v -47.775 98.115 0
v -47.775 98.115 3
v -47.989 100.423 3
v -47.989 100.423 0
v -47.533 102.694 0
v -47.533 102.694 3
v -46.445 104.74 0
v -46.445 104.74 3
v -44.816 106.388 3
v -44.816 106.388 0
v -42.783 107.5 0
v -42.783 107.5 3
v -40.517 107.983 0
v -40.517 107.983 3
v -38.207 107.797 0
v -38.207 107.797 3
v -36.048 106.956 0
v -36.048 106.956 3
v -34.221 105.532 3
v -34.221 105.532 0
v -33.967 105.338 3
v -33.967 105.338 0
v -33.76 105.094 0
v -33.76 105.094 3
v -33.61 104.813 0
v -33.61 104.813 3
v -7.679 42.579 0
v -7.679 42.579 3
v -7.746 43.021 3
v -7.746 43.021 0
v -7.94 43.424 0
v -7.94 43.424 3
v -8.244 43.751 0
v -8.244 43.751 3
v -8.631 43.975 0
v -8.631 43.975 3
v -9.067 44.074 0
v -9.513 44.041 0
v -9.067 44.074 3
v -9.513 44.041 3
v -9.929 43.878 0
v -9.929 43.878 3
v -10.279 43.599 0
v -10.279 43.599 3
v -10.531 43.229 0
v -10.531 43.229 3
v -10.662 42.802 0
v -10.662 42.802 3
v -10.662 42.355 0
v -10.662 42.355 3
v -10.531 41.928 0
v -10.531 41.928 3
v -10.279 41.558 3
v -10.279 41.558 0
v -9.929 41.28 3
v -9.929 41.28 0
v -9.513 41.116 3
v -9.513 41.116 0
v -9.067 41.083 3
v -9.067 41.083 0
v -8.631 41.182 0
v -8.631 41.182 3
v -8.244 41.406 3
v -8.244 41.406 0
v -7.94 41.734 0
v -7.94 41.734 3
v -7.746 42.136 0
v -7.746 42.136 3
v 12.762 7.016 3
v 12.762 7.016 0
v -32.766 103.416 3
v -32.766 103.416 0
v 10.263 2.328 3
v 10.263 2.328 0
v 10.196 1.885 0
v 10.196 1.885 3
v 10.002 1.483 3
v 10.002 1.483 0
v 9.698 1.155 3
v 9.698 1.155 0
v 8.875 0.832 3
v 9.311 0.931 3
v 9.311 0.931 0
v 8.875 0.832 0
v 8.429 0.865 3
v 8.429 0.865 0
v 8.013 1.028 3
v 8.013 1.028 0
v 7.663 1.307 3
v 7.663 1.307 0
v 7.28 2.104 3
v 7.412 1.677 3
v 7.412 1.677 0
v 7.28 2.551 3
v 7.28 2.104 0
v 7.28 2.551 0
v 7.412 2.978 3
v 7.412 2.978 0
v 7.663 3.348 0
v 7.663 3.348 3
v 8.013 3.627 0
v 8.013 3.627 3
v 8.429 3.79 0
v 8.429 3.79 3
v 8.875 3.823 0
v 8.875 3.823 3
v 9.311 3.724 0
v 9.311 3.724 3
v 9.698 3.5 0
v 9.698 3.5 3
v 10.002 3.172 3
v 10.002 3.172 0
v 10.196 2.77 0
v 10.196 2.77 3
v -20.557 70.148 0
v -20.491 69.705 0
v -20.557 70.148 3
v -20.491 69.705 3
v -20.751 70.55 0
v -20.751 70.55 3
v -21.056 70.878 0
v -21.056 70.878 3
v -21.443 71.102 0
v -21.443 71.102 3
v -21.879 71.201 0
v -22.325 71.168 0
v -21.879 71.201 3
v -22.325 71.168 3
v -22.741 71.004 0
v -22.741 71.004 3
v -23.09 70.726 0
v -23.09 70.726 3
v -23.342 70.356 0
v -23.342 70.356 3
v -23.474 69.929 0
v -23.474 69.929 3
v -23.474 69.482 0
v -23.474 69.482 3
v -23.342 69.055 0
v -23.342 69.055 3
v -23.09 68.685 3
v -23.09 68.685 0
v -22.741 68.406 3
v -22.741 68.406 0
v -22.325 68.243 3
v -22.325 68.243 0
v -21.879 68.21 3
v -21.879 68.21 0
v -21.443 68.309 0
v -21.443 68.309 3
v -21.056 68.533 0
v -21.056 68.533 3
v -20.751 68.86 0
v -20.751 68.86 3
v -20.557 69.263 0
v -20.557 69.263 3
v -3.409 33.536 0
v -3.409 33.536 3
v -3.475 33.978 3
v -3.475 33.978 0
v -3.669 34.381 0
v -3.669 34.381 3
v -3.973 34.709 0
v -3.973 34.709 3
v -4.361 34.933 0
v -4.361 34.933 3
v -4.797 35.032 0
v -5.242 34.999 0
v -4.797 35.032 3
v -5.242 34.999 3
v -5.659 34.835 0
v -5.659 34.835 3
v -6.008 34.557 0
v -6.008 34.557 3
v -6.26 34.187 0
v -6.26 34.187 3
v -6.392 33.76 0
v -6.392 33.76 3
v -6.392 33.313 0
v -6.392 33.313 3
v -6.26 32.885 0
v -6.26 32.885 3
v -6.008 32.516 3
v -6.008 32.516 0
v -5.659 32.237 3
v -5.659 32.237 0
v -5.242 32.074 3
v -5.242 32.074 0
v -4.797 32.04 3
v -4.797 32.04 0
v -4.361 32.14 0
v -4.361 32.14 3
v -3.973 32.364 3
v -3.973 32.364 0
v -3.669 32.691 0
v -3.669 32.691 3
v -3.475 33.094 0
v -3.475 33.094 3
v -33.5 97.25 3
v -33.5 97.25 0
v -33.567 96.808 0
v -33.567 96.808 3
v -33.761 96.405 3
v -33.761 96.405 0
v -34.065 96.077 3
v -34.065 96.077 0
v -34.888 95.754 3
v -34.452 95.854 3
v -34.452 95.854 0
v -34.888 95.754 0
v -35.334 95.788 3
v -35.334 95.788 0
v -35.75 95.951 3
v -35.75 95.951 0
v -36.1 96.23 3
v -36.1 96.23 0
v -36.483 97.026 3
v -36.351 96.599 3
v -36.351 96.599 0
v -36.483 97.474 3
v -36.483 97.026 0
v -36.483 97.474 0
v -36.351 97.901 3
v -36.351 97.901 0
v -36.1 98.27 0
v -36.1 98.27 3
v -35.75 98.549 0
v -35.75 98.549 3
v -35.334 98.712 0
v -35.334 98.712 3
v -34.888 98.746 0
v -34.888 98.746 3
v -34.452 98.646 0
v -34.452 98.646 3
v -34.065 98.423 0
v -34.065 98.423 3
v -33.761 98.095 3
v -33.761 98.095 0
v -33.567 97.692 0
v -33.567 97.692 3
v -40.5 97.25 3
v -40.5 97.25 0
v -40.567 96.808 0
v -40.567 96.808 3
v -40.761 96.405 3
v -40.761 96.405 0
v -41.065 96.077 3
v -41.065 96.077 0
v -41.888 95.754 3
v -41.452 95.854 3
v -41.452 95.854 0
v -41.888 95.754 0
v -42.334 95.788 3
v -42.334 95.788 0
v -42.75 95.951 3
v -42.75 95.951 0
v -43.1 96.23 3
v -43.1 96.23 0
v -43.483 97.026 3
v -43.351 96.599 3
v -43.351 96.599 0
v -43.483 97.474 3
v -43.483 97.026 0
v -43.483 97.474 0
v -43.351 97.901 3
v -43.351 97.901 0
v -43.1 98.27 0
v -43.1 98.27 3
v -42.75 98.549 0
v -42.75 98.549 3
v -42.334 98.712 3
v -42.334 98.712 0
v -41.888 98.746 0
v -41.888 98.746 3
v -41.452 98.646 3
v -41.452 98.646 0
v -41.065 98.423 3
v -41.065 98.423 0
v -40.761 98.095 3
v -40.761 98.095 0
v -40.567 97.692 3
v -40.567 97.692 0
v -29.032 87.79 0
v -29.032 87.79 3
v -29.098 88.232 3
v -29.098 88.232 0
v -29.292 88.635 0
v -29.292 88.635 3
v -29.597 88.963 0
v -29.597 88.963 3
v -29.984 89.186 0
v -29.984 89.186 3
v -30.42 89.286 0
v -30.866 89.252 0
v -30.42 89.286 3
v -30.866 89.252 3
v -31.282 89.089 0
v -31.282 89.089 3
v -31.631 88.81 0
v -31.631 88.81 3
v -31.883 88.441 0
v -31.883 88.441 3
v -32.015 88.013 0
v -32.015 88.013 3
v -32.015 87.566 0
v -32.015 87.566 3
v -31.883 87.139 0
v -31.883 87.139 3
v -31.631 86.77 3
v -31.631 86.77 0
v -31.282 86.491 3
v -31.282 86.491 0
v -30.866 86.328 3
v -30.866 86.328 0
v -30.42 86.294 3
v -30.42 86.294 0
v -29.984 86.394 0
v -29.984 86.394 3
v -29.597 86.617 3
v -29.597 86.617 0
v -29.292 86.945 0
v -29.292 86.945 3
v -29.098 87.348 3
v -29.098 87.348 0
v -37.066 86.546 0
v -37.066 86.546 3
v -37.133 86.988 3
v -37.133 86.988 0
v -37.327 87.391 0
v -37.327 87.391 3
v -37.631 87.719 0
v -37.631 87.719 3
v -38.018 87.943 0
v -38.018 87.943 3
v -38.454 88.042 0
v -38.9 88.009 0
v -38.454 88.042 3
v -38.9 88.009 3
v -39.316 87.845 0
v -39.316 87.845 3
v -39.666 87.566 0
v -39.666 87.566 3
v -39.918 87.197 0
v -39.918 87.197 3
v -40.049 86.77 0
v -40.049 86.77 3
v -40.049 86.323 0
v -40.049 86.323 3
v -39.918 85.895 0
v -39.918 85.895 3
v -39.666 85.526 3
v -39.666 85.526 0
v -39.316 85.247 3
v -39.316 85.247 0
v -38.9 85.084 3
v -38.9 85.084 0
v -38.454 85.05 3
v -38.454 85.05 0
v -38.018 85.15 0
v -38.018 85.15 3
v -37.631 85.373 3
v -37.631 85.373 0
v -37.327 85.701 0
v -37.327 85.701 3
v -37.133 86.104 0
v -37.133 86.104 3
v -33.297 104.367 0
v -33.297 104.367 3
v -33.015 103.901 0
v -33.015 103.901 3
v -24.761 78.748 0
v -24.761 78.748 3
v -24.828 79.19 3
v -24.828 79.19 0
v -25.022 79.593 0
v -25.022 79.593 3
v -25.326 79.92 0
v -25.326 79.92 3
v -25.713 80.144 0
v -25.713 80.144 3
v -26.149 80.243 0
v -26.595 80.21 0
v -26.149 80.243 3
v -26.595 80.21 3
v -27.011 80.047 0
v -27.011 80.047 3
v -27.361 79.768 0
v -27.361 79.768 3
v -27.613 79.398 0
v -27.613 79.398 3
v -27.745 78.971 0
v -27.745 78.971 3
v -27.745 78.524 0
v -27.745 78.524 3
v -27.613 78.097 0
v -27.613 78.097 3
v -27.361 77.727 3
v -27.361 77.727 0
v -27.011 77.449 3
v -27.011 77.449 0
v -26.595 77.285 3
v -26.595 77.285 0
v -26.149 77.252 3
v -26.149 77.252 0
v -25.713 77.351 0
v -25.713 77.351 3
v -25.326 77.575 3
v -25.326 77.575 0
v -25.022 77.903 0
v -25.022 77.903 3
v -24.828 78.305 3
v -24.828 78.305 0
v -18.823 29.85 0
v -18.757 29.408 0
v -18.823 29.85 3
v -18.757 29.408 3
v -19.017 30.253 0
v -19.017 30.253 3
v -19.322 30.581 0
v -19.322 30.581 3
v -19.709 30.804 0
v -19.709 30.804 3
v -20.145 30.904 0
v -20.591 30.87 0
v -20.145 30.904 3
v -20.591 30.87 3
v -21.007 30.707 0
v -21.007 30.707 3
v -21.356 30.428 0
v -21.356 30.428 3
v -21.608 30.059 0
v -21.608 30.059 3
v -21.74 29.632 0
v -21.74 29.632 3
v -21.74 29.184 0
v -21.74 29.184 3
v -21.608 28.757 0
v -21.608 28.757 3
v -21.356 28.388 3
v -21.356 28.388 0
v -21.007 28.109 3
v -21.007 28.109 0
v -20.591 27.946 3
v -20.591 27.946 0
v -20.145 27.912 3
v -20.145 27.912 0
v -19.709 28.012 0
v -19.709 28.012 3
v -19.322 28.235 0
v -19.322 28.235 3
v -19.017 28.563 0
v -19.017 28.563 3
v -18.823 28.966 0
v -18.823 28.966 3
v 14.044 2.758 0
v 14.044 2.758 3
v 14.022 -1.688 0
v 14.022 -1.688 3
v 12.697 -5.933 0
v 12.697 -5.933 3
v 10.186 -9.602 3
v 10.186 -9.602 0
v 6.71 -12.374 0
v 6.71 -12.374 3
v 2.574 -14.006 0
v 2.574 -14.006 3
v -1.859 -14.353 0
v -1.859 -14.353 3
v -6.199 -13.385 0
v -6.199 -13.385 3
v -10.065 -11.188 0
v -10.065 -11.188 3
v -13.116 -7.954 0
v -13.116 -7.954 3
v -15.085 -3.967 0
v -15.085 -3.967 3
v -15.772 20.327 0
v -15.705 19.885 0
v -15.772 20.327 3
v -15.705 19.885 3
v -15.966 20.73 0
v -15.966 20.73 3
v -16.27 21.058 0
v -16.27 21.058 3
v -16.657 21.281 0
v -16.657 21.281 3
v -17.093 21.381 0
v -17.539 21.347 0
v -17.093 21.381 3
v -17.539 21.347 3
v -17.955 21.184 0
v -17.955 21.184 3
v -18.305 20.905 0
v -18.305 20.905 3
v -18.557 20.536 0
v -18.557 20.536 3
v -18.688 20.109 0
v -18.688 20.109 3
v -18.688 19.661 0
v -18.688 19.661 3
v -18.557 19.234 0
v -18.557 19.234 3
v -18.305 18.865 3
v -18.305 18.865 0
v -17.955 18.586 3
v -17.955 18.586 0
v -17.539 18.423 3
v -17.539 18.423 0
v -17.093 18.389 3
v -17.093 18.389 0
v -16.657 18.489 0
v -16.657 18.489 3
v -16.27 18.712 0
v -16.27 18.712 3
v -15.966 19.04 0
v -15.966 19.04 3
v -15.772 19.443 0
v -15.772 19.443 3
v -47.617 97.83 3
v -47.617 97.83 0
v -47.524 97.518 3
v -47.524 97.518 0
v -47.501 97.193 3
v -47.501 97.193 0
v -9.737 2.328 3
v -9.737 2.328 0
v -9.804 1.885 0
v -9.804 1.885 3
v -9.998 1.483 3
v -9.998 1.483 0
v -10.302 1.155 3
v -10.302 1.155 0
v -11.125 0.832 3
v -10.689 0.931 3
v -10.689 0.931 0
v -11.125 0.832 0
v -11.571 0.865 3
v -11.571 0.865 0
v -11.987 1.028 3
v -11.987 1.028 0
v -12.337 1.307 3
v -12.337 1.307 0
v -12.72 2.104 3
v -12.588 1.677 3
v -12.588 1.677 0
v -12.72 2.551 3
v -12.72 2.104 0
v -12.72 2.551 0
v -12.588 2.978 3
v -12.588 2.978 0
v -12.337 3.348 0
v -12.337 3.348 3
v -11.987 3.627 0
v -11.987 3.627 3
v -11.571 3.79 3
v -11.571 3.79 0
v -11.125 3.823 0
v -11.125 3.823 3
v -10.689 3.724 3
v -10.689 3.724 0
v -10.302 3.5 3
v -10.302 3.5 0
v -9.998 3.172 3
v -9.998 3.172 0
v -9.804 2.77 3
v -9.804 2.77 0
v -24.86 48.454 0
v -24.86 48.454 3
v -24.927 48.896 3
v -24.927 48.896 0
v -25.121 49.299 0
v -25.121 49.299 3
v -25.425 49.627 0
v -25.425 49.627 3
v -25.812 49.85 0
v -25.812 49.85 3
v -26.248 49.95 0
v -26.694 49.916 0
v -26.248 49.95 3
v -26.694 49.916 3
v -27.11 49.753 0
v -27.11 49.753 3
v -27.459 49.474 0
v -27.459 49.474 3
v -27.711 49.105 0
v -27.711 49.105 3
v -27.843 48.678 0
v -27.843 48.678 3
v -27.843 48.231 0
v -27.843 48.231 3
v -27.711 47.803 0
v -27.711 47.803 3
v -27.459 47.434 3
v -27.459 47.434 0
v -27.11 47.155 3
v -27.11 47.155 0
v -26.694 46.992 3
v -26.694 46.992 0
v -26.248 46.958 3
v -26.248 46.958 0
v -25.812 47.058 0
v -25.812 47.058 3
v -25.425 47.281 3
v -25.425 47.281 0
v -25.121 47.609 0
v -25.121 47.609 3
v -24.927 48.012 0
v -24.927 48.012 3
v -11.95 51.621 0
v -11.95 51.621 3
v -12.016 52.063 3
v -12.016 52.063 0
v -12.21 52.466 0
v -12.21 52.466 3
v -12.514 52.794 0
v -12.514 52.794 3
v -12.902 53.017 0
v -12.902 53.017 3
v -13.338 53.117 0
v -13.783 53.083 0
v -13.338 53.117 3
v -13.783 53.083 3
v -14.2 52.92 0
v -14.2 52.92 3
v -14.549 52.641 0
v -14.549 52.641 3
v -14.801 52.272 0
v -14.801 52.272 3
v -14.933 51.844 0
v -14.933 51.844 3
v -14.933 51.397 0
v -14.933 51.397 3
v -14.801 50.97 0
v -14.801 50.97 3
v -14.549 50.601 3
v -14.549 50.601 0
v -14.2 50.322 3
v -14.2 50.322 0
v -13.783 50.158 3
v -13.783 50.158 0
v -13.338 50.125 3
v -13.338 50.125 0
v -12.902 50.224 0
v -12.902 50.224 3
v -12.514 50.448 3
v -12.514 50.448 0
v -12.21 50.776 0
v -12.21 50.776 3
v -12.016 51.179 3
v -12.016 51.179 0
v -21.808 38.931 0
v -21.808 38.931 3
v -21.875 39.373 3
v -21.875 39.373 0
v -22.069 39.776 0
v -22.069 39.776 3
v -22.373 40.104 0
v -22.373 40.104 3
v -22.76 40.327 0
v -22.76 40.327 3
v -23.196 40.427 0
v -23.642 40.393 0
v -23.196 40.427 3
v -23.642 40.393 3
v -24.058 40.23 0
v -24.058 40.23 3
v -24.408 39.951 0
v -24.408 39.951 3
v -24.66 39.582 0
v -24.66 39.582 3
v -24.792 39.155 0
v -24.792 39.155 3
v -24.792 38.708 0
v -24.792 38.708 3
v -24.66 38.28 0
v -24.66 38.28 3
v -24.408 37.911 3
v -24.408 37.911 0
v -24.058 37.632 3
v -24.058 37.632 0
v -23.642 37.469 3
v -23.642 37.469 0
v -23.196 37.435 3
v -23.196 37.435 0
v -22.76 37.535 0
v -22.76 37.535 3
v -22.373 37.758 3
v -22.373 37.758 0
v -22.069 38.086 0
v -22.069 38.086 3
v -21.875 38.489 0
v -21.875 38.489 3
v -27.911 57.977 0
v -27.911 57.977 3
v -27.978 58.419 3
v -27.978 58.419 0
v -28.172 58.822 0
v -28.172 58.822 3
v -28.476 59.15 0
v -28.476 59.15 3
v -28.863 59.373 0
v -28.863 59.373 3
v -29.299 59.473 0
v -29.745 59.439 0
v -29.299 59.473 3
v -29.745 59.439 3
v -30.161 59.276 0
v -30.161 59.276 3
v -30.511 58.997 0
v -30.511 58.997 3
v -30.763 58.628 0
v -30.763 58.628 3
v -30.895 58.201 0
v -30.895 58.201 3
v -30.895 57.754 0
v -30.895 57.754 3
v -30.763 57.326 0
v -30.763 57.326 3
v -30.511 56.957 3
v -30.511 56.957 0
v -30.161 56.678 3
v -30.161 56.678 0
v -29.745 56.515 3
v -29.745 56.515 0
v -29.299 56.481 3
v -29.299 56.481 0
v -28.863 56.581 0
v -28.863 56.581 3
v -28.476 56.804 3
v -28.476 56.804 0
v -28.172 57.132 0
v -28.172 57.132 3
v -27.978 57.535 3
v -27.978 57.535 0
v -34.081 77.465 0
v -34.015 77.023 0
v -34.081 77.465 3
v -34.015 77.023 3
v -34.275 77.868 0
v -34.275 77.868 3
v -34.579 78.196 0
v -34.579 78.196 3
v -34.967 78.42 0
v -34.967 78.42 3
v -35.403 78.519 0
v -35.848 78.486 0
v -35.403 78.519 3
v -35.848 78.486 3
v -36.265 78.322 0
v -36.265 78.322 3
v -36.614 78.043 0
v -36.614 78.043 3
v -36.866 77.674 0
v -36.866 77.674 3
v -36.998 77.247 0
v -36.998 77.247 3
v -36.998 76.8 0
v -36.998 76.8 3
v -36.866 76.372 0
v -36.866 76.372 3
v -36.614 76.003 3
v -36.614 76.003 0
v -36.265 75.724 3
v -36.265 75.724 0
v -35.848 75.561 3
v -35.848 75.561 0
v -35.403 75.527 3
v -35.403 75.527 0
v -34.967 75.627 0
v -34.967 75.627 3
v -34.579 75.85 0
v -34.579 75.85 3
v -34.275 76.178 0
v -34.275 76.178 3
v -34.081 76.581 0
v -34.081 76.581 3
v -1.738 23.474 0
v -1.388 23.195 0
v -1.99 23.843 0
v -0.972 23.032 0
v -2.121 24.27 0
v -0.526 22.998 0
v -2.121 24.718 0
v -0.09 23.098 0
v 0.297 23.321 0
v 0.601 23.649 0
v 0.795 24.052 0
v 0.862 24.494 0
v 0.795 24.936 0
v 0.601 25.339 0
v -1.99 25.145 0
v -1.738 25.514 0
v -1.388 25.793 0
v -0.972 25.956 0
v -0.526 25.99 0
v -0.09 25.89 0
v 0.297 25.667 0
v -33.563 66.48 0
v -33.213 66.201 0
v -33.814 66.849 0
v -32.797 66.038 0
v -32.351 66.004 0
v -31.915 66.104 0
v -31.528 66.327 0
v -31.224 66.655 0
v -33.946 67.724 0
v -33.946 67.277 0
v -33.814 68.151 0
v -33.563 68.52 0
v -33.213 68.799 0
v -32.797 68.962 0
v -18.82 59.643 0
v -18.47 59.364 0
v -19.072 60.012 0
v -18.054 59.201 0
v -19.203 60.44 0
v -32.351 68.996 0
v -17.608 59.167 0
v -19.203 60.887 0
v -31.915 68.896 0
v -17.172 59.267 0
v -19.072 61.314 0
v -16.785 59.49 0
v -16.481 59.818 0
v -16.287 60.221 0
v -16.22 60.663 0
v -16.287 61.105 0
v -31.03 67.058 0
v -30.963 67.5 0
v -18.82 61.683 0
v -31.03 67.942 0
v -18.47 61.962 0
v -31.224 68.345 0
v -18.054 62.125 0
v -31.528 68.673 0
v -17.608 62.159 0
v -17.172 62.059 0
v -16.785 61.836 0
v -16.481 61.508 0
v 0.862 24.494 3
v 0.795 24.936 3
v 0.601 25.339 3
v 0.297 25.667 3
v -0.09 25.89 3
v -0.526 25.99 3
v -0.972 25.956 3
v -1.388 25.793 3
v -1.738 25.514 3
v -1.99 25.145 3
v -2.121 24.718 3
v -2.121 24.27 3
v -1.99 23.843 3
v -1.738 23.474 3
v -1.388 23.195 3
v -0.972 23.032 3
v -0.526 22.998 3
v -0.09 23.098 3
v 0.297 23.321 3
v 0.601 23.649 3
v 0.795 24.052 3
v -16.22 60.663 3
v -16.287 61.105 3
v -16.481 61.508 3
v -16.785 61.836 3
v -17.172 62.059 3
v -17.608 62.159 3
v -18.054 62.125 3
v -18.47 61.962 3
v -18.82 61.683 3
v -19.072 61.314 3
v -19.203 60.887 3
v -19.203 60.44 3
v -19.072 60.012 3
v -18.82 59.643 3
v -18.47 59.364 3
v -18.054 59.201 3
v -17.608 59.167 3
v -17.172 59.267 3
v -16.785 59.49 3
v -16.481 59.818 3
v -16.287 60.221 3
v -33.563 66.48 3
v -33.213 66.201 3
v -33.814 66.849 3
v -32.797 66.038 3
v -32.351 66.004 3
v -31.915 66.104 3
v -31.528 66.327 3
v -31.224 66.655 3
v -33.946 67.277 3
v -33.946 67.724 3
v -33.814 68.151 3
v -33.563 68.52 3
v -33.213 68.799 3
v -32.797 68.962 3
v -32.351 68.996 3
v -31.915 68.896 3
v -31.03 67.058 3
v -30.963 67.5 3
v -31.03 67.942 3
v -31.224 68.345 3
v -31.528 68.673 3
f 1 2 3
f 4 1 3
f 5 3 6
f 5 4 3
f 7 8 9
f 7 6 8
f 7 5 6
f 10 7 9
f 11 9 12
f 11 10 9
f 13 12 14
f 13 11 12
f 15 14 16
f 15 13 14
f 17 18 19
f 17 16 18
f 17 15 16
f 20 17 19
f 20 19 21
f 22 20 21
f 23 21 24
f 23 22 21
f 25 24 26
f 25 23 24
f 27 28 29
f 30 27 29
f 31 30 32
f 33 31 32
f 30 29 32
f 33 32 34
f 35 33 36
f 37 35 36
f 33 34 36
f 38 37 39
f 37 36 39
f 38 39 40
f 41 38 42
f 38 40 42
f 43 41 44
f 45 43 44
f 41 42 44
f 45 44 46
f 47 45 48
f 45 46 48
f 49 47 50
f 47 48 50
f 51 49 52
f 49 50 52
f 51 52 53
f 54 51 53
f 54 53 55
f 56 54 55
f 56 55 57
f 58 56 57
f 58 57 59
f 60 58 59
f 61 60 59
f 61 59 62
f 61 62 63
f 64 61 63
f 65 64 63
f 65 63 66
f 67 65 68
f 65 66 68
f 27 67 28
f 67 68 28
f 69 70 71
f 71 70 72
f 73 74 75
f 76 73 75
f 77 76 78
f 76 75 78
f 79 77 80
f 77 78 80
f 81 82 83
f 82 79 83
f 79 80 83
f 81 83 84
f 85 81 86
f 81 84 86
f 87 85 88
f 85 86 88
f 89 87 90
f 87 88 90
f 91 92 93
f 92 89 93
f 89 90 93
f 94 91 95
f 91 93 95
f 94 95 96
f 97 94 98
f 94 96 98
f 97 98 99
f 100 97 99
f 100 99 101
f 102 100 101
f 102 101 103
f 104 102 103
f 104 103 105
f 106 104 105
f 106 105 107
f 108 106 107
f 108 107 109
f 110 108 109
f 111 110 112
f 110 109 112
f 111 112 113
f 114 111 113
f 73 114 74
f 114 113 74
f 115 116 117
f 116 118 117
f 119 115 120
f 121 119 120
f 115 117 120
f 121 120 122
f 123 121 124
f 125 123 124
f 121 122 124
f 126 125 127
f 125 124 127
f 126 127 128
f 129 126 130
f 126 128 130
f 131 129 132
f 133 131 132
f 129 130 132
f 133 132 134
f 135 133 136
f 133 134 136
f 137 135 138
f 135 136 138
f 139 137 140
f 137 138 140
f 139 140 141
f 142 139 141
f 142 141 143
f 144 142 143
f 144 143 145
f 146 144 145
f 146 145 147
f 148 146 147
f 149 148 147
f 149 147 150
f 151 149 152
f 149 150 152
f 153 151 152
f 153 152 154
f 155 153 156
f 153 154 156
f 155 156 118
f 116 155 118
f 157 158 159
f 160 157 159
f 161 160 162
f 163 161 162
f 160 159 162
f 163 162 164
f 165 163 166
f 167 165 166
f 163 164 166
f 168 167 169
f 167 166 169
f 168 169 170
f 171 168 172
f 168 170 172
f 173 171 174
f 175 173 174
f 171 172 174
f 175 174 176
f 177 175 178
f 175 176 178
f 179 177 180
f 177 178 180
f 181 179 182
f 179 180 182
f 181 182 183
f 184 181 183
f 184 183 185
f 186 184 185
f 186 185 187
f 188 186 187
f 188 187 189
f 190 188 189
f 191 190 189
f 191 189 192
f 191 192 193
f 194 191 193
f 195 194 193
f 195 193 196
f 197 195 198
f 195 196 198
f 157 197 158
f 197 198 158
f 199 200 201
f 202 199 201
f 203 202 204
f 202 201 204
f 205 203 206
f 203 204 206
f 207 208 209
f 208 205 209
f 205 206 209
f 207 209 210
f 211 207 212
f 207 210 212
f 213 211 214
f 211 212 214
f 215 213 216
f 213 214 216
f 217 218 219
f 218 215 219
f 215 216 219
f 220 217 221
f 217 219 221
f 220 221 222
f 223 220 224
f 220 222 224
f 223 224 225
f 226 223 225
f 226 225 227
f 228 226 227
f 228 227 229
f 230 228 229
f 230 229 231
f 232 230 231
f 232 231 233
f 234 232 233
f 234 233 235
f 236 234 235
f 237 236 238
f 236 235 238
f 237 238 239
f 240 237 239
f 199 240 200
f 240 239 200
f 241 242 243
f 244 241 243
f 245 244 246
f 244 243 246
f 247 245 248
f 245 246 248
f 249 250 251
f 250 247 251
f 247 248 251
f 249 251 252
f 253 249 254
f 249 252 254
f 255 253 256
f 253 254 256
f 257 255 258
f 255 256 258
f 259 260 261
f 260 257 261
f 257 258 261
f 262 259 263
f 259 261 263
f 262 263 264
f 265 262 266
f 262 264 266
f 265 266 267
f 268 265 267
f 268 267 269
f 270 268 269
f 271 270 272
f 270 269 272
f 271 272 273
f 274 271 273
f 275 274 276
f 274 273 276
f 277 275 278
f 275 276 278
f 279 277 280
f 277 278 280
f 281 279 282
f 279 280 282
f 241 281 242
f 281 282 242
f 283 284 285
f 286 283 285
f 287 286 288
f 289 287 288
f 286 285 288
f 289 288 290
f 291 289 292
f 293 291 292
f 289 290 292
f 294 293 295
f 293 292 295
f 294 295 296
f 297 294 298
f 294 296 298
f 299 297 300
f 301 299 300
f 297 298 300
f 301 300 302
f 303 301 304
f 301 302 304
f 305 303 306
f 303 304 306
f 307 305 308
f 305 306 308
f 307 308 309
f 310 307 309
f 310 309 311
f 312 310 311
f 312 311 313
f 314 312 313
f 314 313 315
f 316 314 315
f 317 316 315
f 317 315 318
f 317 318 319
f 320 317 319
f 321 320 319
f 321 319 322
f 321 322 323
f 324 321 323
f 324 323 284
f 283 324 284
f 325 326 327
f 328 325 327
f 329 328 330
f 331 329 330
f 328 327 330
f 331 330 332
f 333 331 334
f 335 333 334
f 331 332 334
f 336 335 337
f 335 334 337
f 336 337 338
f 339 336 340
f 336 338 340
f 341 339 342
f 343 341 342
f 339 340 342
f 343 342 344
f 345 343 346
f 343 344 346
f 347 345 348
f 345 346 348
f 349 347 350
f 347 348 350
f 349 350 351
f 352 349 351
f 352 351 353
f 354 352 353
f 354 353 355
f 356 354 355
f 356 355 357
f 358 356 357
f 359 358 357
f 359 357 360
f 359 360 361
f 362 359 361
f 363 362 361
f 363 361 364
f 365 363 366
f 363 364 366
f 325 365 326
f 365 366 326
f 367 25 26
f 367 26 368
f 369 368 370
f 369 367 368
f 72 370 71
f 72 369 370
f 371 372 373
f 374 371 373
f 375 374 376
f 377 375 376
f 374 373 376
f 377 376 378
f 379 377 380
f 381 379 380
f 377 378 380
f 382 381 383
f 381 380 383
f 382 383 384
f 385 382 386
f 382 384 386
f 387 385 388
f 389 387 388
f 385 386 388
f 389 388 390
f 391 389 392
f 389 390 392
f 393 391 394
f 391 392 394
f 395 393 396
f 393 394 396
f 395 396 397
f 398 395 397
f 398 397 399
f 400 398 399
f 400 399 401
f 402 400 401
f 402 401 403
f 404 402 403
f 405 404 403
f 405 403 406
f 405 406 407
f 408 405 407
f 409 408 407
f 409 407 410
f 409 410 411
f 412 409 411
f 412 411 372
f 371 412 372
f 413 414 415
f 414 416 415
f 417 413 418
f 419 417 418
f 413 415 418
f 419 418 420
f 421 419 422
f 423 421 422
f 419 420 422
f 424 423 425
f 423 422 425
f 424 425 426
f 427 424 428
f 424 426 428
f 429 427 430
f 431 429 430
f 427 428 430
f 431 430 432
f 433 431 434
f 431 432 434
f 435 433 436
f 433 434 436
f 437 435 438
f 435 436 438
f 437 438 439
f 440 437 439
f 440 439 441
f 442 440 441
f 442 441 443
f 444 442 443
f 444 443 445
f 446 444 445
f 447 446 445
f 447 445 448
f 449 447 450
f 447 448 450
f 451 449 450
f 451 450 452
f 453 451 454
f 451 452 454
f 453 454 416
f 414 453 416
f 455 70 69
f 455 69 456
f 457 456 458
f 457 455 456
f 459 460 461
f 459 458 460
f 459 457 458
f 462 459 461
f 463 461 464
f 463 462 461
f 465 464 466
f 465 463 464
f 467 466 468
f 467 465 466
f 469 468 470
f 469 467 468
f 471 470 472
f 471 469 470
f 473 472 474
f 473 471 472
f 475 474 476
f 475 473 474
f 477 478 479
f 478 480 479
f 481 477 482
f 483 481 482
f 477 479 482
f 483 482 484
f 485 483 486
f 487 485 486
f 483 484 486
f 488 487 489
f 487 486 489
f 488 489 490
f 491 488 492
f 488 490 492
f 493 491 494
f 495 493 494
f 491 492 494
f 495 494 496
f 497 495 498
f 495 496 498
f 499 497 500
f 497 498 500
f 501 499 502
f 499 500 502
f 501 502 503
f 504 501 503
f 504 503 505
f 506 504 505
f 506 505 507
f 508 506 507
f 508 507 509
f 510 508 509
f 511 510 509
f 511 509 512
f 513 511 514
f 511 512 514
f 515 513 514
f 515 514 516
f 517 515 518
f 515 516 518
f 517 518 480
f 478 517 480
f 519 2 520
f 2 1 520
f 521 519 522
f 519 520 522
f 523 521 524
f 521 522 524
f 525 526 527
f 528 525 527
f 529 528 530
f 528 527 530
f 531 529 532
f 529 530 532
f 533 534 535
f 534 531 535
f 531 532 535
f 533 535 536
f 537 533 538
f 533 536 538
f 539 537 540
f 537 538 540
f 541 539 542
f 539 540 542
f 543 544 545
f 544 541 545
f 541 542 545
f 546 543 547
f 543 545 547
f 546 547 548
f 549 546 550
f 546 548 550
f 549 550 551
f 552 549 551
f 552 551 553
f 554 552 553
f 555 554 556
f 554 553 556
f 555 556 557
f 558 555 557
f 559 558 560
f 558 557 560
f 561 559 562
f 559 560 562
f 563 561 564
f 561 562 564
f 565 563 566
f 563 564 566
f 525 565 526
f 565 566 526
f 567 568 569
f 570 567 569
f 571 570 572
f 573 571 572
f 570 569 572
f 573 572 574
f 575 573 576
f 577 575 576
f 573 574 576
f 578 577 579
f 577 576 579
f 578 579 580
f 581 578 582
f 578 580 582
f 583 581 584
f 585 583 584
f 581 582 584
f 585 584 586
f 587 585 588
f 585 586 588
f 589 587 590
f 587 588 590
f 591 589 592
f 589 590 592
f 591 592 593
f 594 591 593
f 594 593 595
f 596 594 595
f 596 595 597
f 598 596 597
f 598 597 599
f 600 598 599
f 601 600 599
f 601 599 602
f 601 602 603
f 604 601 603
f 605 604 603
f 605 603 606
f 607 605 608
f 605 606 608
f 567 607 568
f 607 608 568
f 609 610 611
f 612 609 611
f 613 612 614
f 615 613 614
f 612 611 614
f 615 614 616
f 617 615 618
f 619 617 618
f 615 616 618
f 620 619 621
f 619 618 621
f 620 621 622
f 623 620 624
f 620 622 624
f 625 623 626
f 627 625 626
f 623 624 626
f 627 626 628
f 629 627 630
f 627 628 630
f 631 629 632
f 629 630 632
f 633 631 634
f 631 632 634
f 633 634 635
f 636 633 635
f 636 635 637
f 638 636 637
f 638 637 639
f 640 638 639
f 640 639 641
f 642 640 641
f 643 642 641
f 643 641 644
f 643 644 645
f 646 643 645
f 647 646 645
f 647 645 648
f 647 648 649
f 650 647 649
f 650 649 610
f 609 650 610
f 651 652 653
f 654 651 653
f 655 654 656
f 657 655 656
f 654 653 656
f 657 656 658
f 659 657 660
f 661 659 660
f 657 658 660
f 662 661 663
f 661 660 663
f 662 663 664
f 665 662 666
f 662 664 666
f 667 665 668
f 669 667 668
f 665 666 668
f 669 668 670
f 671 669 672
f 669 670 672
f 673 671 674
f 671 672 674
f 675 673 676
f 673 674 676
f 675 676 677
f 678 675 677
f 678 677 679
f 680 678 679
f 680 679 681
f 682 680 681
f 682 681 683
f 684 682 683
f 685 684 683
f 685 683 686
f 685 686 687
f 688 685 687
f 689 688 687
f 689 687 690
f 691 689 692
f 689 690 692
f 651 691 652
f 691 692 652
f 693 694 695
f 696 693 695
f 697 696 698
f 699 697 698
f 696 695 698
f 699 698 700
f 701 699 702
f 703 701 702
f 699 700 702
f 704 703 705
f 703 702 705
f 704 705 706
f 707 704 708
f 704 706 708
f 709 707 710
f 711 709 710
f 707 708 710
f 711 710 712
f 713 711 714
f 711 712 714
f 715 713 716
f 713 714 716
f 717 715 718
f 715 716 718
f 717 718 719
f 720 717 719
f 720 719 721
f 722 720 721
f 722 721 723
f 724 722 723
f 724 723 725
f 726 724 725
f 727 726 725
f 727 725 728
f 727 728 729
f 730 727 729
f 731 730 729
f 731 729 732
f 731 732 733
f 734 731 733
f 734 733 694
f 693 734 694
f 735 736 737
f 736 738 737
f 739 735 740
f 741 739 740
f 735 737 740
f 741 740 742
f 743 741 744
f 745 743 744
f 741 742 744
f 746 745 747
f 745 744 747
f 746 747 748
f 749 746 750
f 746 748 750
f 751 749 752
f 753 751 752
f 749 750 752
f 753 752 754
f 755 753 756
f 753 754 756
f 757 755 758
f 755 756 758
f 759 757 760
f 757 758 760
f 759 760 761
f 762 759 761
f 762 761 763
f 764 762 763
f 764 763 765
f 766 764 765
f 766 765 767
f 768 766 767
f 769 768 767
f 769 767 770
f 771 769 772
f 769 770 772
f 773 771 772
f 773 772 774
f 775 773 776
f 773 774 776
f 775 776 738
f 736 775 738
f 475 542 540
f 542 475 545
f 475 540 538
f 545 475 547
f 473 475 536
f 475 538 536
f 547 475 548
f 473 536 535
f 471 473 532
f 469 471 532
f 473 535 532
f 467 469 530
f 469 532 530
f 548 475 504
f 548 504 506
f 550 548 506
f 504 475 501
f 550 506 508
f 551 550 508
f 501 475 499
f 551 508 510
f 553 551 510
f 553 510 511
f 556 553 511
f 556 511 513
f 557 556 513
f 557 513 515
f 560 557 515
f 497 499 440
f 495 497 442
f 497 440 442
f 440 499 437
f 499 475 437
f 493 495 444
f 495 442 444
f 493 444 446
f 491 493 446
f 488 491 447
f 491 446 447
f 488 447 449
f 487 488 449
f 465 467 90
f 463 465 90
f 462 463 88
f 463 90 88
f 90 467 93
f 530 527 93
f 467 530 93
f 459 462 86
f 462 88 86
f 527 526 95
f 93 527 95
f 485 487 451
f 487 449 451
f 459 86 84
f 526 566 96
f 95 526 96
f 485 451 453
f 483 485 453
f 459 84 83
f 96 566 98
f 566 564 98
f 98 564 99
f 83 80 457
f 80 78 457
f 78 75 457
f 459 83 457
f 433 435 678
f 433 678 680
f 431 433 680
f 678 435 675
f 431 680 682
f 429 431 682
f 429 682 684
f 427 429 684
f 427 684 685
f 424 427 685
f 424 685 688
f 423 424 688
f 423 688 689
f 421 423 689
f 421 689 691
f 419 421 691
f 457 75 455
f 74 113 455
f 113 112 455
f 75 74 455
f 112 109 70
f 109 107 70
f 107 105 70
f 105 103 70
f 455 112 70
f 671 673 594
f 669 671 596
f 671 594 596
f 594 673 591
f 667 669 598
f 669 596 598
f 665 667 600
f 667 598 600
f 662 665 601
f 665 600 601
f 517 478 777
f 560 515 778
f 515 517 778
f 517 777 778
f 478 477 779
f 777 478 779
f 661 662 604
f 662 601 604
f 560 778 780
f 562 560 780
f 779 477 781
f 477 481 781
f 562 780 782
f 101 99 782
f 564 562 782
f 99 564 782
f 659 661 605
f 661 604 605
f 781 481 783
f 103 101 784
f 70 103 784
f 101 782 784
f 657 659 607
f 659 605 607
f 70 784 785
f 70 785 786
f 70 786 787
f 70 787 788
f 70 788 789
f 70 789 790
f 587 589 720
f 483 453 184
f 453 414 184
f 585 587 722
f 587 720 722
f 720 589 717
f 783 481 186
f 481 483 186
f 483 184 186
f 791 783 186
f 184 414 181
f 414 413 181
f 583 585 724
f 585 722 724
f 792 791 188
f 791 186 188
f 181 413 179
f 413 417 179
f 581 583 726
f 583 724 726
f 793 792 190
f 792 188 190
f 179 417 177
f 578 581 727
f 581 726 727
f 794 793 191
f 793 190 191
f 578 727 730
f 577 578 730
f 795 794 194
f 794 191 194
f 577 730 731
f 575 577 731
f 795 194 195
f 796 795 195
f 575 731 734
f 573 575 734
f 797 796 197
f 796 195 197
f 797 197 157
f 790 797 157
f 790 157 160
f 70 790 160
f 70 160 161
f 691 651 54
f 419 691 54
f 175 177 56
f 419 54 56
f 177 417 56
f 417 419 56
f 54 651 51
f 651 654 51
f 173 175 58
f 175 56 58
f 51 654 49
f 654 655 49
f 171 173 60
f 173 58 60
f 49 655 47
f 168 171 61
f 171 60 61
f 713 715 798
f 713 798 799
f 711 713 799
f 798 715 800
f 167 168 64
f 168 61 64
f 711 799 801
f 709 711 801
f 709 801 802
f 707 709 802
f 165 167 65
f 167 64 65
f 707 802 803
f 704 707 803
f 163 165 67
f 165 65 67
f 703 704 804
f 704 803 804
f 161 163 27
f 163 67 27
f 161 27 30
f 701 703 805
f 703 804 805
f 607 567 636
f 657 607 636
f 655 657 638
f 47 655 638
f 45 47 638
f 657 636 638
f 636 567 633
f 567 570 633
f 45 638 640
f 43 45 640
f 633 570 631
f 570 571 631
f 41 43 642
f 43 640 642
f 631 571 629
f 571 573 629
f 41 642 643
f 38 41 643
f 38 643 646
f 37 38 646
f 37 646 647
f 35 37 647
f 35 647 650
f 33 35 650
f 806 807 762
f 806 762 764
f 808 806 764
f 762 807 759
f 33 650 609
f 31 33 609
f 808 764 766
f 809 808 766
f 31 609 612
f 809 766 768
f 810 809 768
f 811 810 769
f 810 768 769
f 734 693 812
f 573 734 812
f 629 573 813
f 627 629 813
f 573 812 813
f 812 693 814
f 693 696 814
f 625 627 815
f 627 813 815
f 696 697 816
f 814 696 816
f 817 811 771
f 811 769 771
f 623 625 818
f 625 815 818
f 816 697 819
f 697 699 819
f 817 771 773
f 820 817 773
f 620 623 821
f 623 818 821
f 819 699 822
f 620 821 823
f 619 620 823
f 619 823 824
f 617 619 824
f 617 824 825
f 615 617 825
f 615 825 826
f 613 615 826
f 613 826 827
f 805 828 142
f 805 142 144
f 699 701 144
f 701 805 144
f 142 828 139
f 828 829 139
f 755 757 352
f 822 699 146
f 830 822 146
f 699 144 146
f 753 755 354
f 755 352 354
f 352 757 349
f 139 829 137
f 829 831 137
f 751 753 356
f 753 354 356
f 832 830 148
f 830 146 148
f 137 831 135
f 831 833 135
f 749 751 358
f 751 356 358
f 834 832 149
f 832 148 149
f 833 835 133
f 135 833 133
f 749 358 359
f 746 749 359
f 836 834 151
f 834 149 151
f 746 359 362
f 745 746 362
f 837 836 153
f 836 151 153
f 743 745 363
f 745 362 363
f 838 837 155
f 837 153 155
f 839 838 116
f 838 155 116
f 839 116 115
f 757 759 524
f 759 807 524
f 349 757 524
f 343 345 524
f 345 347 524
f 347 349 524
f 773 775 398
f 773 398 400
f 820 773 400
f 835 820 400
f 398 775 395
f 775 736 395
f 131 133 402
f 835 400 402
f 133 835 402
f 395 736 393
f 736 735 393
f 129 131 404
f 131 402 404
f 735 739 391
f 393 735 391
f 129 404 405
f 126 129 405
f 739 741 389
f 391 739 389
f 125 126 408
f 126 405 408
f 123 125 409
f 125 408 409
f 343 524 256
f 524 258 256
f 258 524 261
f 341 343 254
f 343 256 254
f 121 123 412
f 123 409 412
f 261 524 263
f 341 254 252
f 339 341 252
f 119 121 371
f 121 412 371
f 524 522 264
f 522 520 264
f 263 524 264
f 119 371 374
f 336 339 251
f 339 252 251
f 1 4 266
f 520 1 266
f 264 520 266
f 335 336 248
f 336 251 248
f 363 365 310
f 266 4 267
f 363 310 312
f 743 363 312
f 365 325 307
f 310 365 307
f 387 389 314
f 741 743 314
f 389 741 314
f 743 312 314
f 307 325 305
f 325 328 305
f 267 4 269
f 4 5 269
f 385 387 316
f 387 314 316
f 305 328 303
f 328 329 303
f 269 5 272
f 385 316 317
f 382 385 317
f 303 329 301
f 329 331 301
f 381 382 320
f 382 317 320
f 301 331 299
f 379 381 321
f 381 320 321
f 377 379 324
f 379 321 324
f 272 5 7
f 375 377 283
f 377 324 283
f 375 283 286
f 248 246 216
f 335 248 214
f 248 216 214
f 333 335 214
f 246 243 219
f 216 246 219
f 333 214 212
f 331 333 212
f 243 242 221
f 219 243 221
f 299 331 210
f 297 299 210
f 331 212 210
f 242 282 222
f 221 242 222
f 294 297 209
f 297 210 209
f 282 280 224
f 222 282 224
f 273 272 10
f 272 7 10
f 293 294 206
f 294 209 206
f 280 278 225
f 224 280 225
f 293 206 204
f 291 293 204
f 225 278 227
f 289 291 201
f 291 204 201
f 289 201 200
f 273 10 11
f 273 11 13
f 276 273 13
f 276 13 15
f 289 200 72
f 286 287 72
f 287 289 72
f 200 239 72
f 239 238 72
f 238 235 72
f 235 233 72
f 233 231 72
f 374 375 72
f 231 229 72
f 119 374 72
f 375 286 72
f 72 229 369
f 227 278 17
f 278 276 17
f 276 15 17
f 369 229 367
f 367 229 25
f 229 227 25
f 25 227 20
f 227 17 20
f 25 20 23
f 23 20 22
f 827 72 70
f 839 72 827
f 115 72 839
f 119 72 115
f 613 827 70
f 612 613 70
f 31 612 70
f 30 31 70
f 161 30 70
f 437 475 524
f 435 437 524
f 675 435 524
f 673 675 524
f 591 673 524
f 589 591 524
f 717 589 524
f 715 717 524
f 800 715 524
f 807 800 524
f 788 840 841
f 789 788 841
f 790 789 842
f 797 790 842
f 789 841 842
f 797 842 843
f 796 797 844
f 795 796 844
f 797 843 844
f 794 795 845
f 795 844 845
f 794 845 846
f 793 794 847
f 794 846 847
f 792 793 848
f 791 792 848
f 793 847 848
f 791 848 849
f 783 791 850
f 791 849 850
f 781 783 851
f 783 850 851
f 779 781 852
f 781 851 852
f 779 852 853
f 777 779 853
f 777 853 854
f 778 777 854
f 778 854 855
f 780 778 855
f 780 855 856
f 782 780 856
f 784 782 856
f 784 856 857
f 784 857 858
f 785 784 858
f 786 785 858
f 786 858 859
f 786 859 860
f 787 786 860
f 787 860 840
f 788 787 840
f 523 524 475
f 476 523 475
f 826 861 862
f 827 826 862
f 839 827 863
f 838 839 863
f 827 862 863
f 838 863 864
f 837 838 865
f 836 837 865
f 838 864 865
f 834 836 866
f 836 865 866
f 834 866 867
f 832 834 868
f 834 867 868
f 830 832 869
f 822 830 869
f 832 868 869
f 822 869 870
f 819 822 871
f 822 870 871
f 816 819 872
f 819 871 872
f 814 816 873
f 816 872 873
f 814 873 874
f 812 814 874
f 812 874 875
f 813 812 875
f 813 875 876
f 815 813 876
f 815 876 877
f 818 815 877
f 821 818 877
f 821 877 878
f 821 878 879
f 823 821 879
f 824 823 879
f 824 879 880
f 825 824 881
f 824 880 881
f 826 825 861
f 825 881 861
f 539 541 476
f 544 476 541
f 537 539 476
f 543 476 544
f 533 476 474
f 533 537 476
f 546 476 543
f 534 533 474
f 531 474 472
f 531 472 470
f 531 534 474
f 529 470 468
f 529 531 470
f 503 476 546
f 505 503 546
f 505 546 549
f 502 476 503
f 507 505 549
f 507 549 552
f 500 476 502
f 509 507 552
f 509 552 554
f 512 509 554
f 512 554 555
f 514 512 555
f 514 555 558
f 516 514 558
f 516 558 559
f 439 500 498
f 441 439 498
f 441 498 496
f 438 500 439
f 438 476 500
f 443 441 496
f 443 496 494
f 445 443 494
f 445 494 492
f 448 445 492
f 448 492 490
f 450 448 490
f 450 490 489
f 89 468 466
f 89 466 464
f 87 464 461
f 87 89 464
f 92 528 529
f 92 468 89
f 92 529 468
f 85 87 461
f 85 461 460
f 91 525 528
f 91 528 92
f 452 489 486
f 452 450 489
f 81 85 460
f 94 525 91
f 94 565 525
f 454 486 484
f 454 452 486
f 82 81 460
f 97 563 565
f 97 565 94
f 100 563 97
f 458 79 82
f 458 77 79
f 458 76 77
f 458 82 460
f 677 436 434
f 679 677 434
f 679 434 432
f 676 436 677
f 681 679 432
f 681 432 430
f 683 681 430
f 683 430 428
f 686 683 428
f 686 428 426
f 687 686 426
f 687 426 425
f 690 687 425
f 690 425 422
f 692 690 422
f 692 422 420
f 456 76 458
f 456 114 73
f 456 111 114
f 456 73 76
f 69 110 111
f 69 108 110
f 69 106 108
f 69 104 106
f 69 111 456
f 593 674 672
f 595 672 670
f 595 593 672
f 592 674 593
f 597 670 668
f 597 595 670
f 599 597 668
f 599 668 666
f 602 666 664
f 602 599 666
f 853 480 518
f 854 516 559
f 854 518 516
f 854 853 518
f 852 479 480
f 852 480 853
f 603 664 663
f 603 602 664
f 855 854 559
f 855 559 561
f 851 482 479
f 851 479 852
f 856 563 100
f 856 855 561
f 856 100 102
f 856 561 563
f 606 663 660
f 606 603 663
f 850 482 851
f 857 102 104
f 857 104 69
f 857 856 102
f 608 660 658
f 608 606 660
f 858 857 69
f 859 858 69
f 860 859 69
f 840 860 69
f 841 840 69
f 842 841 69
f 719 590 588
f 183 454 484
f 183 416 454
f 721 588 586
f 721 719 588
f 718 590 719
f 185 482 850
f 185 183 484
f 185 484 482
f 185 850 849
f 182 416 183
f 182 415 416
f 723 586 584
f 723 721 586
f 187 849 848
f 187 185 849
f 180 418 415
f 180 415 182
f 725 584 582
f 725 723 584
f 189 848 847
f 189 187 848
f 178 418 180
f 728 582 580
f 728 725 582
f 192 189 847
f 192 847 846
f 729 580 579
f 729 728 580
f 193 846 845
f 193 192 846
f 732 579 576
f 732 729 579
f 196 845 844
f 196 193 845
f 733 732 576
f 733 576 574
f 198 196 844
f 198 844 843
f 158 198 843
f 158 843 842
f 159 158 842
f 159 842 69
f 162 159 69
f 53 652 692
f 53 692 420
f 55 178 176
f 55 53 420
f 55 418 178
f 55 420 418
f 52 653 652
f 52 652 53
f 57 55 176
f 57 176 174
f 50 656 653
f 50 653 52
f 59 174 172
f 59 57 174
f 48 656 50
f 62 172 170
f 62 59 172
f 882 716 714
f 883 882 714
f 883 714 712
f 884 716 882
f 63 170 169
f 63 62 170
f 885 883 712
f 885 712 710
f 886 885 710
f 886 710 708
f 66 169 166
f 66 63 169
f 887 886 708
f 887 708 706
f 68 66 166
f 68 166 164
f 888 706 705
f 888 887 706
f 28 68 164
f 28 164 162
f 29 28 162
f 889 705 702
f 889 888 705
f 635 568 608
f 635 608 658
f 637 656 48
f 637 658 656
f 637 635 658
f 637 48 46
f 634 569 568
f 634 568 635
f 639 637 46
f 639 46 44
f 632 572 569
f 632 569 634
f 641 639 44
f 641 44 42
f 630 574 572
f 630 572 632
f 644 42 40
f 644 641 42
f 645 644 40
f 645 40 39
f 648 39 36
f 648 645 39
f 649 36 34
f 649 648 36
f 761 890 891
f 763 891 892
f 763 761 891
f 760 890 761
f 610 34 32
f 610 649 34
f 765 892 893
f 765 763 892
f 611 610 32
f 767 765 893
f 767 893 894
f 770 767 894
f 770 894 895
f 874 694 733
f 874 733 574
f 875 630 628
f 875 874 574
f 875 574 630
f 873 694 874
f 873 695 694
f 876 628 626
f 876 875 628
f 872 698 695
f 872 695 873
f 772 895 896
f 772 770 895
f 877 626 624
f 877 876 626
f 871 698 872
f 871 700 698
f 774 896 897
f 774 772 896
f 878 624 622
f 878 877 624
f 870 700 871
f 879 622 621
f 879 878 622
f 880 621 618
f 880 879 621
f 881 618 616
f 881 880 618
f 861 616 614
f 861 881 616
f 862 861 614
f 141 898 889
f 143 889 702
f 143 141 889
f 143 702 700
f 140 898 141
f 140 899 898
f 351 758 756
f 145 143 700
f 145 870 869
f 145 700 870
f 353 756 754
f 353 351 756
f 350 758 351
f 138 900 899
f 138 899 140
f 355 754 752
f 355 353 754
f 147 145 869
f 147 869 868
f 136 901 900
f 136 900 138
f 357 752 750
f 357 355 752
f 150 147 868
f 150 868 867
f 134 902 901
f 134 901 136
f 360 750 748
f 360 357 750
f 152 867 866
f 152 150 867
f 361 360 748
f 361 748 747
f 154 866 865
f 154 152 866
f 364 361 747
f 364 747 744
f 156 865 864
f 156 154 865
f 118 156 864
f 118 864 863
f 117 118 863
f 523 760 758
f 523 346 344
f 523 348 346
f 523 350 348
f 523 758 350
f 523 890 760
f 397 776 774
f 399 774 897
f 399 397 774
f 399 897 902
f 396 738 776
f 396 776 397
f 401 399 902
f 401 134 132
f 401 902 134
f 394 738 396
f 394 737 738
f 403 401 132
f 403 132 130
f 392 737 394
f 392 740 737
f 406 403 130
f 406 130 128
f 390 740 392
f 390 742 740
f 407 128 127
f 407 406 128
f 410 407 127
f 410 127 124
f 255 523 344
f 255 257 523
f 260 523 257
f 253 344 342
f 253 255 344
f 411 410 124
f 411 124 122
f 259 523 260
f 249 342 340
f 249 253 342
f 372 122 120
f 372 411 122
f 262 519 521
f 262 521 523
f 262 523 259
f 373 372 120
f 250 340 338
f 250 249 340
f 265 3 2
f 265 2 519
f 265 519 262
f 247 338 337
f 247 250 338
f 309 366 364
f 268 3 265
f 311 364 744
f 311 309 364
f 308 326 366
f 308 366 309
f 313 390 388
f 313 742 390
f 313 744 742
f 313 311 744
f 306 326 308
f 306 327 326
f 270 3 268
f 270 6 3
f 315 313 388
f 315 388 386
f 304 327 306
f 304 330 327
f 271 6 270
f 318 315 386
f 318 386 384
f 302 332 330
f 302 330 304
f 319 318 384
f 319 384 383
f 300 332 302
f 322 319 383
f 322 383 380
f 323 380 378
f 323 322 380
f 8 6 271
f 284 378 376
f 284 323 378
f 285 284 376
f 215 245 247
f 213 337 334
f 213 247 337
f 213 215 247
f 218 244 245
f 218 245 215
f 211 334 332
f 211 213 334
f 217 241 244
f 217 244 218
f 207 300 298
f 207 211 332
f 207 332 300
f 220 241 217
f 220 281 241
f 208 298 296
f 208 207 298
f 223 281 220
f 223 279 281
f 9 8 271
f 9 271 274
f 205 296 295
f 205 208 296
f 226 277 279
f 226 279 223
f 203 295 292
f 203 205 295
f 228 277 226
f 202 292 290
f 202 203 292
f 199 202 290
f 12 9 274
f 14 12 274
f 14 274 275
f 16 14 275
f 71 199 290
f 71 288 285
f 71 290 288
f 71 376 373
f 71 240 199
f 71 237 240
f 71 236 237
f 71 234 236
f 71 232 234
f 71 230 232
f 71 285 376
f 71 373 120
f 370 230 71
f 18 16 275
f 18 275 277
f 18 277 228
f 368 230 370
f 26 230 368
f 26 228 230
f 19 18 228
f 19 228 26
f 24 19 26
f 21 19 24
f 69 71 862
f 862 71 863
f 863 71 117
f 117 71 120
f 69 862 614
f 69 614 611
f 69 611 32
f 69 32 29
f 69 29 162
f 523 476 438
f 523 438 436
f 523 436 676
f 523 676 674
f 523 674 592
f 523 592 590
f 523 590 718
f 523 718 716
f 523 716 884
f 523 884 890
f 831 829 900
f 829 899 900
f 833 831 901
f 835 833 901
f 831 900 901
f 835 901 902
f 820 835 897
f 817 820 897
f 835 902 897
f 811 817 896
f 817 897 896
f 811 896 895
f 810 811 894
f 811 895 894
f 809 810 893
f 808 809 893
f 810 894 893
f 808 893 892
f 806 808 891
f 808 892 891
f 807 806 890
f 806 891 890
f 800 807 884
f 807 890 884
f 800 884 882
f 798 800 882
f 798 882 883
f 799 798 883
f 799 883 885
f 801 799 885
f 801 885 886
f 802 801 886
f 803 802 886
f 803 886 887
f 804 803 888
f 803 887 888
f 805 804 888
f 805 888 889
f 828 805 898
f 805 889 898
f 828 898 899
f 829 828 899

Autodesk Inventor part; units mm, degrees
ref_plane "YZ Plane" through (0, 0, 0) normal (1, 0, 0) x (0, 1, 0)
ref_plane "XZ Plane" through (0, 0, 0) normal (0, 1, 0) x (-1, 0, 0)
ref_plane "XY Plane" through (0, 0, 0) normal (0, 0, 1) x (1, 0, 0)
sketch "Эскиз1" plane through (0, 0, 0) normal (0, 0, 1) x (1, 0, 0)
  line L0 (15, -22.25) -> (15, 22.25) projected
  line L1 (15, 22.25) -> (-20, 22.25) projected
  line L2 (-20, 22.25) -> (-20, -22.25) projected
  line L3 (-20, -22.25) -> (15, -22.25) projected
  circle A0 centre (8.763, 2.3275) radius 1.5 projected
  circle A1 centre (8.763, 7.3275) radius 1.5 projected
  circle A2 centre (-11.237, -7.6725) radius 1.5 projected
  circle A3 centre (-11.237, -2.6725) radius 1.5 projected
  circle A4 centre (8.763, -2.6725) radius 1.5 projected
  circle A5 centre (8.763, -7.6725) radius 1.5 projected
  circle A6 centre (-11.237, 2.3275) radius 1.5 projected
  circle A7 centre (-11.237, 7.3275) radius 1.5 projected
  line L4 (-25, 92.25) -> (-62.0049, 92.25) projected
  line L5 (-103.637, 92.25) -> (-67.893, 92.25) projected
  circle A8 centre (-49, 104.25) radius 1.5 projected
  circle A9 centre (-42, 104.25) radius 1.5 projected
  circle A10 centre (-35, 104.25) radius 1.5 projected
  circle A11 centre (-35, 111.25) radius 1.5 projected
  circle A12 centre (-42, 118.25) radius 1.5 projected
  circle A13 centre (-49, 118.25) radius 1.5 projected
  circle A14 centre (-49, 111.25) radius 1.5 projected
  circle A15 centre (-35, 118.25) radius 1.5 projected
  circle A16 centre (-42, 111.25) radius 1.5 projected
  circle A17 centre (-42, 97.25) radius 1.5 projected
  circle A18 centre (-35, 97.25) radius 1.5 projected
  circle A19 centre (-49, 97.25) radius 1.5 projected
  line L6 (-25, 92.25) -> (-62.0049, 92.25) projected
  line L7 (-25, 95.25) -> (-25, 92.25) projected
  line L8 (-20, 95.25) -> (-25, 95.25) projected
  line L9 (-20, 95.25) -> (-20, 123.25) projected
  line L10 (-28, 123.25) -> (-20, 123.25) projected
  line L11 (-28, 129.25) -> (-28, 123.25) projected
  line L12 (-28, 129.25) -> (-62.0049, 129.25) projected
  line L13 (-62.0049, 92.25) -> (-62.0049, 129.25) projected
  line L14 (-5.1452, 11.625) -> (-40, 100) construction
  arc A20 (-32.5697, 102.9649) -> (-47.4303, 97.0351) centre (-40, 100) ccw
  line L15 (-5.1452, 11.625) -> (-22.5726, 55.8125) construction
  arc A21 (-13.8135, 8.0713) -> (-4.3725, 15.1785) centre (-0.8009, 0.6099) ccw
  line L16 (12.7625, 7.0157) -> (-32.7662, 103.4164)
  line L17 (-47.6184, 97.5588) -> (-15.0854, -3.9674)
  point P0 (0, 0)
  point P1 (-13.8589, 33.7187)
  point P2 (-33.6095, 104.8127)
  point P3 (-34.2206, 105.5316)
  point P4 (-47.7749, 98.1155)
  point P5 (-47.5011, 97.1926)
  dimension "d0" = 8
  dimension "d1" = 95
  dimension "d2" = 100
  dimension "d3" = 40
  dimension "d4" = 15
extrude "Выдавливание1" add sketch "Эскиз1" along normal blind 3 contours L16 A21 L17 L2 L1 | L1 L2 L17 L4 L16 | L4 L17 A19 A20 A10 L16 | A20 A10 | A10 A20 | A1 | A2 | A3 | A4 | A5 | A7 | A9
sketch "Эскиз2" plane through (0, 0, 3) normal (0, 0, 1) x (1, 0, 0)
  circle A0 centre (-38.5661, 86.5462) radius 1.5
  line L0 (-47.5011, 97.1926) -> (-15.0854, -3.9674) projected
  circle A1 centre (-35.5146, 77.0232) radius 1.5
  circle A2 centre (-32.463, 67.5001) radius 1.5
  circle A3 centre (-29.4114, 57.9771) radius 1.5
  circle A4 centre (-26.3599, 48.4541) radius 1.5
  circle A5 centre (-23.3083, 38.9311) radius 1.5
  circle A6 centre (-20.2568, 29.408) radius 1.5
  circle A7 centre (-17.2052, 19.885) radius 1.5
  circle A8 centre (-42, 97.25) radius 1.5 projected
  circle A9 centre (-11.237, 2.3275) radius 1.5 projected
  point P0 (0, 0)
  dimension "d7" = 3
  dimension "d10" = 10
  dimension "d17" = 5.2562
  dimension "d18" = 5.26
extrude "Выдавливание2" cut sketch "Эскиз2" against normal blind 3 contours A0 | A1 | A2 | A3 | A4 | A5 | A6 | A7
sketch "Эскиз3" plane through (0, 0, 3) normal (0, 0, 1) x (1, 0, 0)
  circle A0 centre (-35, 97.25) radius 1.5 projected
  line L0 (12.7625, 7.0157) -> (-32.7662, 103.4164) projected
  circle A1 centre (-30.5318, 87.7899) radius 1.5
  circle A2 centre (-26.2613, 78.7476) radius 1.5
  circle A3 centre (-21.9908, 69.7054) radius 1.5
  circle A4 centre (-17.7202, 60.6631) radius 1.5
  circle A5 centre (-13.4497, 51.6208) radius 1.5
  circle A6 centre (-9.1792, 42.5786) radius 1.5
  circle A7 centre (-4.9086, 33.5363) radius 1.5
  circle A8 centre (-0.6381, 24.494) radius 1.5
  point P0 (0, 0)
  dimension "d19" = 3
  dimension "d20" = 4.6533
  dimension "d21" = 4.653
  dimension "d24" = 10
extrude "Выдавливание3" cut sketch "Эскиз3" against normal blind 3 contours A1 | A2 | A3 | A4 | A5 | A6 | A7 | A8
properties part number "ЛЦМК000002.00.00.00.00.19 мост"
